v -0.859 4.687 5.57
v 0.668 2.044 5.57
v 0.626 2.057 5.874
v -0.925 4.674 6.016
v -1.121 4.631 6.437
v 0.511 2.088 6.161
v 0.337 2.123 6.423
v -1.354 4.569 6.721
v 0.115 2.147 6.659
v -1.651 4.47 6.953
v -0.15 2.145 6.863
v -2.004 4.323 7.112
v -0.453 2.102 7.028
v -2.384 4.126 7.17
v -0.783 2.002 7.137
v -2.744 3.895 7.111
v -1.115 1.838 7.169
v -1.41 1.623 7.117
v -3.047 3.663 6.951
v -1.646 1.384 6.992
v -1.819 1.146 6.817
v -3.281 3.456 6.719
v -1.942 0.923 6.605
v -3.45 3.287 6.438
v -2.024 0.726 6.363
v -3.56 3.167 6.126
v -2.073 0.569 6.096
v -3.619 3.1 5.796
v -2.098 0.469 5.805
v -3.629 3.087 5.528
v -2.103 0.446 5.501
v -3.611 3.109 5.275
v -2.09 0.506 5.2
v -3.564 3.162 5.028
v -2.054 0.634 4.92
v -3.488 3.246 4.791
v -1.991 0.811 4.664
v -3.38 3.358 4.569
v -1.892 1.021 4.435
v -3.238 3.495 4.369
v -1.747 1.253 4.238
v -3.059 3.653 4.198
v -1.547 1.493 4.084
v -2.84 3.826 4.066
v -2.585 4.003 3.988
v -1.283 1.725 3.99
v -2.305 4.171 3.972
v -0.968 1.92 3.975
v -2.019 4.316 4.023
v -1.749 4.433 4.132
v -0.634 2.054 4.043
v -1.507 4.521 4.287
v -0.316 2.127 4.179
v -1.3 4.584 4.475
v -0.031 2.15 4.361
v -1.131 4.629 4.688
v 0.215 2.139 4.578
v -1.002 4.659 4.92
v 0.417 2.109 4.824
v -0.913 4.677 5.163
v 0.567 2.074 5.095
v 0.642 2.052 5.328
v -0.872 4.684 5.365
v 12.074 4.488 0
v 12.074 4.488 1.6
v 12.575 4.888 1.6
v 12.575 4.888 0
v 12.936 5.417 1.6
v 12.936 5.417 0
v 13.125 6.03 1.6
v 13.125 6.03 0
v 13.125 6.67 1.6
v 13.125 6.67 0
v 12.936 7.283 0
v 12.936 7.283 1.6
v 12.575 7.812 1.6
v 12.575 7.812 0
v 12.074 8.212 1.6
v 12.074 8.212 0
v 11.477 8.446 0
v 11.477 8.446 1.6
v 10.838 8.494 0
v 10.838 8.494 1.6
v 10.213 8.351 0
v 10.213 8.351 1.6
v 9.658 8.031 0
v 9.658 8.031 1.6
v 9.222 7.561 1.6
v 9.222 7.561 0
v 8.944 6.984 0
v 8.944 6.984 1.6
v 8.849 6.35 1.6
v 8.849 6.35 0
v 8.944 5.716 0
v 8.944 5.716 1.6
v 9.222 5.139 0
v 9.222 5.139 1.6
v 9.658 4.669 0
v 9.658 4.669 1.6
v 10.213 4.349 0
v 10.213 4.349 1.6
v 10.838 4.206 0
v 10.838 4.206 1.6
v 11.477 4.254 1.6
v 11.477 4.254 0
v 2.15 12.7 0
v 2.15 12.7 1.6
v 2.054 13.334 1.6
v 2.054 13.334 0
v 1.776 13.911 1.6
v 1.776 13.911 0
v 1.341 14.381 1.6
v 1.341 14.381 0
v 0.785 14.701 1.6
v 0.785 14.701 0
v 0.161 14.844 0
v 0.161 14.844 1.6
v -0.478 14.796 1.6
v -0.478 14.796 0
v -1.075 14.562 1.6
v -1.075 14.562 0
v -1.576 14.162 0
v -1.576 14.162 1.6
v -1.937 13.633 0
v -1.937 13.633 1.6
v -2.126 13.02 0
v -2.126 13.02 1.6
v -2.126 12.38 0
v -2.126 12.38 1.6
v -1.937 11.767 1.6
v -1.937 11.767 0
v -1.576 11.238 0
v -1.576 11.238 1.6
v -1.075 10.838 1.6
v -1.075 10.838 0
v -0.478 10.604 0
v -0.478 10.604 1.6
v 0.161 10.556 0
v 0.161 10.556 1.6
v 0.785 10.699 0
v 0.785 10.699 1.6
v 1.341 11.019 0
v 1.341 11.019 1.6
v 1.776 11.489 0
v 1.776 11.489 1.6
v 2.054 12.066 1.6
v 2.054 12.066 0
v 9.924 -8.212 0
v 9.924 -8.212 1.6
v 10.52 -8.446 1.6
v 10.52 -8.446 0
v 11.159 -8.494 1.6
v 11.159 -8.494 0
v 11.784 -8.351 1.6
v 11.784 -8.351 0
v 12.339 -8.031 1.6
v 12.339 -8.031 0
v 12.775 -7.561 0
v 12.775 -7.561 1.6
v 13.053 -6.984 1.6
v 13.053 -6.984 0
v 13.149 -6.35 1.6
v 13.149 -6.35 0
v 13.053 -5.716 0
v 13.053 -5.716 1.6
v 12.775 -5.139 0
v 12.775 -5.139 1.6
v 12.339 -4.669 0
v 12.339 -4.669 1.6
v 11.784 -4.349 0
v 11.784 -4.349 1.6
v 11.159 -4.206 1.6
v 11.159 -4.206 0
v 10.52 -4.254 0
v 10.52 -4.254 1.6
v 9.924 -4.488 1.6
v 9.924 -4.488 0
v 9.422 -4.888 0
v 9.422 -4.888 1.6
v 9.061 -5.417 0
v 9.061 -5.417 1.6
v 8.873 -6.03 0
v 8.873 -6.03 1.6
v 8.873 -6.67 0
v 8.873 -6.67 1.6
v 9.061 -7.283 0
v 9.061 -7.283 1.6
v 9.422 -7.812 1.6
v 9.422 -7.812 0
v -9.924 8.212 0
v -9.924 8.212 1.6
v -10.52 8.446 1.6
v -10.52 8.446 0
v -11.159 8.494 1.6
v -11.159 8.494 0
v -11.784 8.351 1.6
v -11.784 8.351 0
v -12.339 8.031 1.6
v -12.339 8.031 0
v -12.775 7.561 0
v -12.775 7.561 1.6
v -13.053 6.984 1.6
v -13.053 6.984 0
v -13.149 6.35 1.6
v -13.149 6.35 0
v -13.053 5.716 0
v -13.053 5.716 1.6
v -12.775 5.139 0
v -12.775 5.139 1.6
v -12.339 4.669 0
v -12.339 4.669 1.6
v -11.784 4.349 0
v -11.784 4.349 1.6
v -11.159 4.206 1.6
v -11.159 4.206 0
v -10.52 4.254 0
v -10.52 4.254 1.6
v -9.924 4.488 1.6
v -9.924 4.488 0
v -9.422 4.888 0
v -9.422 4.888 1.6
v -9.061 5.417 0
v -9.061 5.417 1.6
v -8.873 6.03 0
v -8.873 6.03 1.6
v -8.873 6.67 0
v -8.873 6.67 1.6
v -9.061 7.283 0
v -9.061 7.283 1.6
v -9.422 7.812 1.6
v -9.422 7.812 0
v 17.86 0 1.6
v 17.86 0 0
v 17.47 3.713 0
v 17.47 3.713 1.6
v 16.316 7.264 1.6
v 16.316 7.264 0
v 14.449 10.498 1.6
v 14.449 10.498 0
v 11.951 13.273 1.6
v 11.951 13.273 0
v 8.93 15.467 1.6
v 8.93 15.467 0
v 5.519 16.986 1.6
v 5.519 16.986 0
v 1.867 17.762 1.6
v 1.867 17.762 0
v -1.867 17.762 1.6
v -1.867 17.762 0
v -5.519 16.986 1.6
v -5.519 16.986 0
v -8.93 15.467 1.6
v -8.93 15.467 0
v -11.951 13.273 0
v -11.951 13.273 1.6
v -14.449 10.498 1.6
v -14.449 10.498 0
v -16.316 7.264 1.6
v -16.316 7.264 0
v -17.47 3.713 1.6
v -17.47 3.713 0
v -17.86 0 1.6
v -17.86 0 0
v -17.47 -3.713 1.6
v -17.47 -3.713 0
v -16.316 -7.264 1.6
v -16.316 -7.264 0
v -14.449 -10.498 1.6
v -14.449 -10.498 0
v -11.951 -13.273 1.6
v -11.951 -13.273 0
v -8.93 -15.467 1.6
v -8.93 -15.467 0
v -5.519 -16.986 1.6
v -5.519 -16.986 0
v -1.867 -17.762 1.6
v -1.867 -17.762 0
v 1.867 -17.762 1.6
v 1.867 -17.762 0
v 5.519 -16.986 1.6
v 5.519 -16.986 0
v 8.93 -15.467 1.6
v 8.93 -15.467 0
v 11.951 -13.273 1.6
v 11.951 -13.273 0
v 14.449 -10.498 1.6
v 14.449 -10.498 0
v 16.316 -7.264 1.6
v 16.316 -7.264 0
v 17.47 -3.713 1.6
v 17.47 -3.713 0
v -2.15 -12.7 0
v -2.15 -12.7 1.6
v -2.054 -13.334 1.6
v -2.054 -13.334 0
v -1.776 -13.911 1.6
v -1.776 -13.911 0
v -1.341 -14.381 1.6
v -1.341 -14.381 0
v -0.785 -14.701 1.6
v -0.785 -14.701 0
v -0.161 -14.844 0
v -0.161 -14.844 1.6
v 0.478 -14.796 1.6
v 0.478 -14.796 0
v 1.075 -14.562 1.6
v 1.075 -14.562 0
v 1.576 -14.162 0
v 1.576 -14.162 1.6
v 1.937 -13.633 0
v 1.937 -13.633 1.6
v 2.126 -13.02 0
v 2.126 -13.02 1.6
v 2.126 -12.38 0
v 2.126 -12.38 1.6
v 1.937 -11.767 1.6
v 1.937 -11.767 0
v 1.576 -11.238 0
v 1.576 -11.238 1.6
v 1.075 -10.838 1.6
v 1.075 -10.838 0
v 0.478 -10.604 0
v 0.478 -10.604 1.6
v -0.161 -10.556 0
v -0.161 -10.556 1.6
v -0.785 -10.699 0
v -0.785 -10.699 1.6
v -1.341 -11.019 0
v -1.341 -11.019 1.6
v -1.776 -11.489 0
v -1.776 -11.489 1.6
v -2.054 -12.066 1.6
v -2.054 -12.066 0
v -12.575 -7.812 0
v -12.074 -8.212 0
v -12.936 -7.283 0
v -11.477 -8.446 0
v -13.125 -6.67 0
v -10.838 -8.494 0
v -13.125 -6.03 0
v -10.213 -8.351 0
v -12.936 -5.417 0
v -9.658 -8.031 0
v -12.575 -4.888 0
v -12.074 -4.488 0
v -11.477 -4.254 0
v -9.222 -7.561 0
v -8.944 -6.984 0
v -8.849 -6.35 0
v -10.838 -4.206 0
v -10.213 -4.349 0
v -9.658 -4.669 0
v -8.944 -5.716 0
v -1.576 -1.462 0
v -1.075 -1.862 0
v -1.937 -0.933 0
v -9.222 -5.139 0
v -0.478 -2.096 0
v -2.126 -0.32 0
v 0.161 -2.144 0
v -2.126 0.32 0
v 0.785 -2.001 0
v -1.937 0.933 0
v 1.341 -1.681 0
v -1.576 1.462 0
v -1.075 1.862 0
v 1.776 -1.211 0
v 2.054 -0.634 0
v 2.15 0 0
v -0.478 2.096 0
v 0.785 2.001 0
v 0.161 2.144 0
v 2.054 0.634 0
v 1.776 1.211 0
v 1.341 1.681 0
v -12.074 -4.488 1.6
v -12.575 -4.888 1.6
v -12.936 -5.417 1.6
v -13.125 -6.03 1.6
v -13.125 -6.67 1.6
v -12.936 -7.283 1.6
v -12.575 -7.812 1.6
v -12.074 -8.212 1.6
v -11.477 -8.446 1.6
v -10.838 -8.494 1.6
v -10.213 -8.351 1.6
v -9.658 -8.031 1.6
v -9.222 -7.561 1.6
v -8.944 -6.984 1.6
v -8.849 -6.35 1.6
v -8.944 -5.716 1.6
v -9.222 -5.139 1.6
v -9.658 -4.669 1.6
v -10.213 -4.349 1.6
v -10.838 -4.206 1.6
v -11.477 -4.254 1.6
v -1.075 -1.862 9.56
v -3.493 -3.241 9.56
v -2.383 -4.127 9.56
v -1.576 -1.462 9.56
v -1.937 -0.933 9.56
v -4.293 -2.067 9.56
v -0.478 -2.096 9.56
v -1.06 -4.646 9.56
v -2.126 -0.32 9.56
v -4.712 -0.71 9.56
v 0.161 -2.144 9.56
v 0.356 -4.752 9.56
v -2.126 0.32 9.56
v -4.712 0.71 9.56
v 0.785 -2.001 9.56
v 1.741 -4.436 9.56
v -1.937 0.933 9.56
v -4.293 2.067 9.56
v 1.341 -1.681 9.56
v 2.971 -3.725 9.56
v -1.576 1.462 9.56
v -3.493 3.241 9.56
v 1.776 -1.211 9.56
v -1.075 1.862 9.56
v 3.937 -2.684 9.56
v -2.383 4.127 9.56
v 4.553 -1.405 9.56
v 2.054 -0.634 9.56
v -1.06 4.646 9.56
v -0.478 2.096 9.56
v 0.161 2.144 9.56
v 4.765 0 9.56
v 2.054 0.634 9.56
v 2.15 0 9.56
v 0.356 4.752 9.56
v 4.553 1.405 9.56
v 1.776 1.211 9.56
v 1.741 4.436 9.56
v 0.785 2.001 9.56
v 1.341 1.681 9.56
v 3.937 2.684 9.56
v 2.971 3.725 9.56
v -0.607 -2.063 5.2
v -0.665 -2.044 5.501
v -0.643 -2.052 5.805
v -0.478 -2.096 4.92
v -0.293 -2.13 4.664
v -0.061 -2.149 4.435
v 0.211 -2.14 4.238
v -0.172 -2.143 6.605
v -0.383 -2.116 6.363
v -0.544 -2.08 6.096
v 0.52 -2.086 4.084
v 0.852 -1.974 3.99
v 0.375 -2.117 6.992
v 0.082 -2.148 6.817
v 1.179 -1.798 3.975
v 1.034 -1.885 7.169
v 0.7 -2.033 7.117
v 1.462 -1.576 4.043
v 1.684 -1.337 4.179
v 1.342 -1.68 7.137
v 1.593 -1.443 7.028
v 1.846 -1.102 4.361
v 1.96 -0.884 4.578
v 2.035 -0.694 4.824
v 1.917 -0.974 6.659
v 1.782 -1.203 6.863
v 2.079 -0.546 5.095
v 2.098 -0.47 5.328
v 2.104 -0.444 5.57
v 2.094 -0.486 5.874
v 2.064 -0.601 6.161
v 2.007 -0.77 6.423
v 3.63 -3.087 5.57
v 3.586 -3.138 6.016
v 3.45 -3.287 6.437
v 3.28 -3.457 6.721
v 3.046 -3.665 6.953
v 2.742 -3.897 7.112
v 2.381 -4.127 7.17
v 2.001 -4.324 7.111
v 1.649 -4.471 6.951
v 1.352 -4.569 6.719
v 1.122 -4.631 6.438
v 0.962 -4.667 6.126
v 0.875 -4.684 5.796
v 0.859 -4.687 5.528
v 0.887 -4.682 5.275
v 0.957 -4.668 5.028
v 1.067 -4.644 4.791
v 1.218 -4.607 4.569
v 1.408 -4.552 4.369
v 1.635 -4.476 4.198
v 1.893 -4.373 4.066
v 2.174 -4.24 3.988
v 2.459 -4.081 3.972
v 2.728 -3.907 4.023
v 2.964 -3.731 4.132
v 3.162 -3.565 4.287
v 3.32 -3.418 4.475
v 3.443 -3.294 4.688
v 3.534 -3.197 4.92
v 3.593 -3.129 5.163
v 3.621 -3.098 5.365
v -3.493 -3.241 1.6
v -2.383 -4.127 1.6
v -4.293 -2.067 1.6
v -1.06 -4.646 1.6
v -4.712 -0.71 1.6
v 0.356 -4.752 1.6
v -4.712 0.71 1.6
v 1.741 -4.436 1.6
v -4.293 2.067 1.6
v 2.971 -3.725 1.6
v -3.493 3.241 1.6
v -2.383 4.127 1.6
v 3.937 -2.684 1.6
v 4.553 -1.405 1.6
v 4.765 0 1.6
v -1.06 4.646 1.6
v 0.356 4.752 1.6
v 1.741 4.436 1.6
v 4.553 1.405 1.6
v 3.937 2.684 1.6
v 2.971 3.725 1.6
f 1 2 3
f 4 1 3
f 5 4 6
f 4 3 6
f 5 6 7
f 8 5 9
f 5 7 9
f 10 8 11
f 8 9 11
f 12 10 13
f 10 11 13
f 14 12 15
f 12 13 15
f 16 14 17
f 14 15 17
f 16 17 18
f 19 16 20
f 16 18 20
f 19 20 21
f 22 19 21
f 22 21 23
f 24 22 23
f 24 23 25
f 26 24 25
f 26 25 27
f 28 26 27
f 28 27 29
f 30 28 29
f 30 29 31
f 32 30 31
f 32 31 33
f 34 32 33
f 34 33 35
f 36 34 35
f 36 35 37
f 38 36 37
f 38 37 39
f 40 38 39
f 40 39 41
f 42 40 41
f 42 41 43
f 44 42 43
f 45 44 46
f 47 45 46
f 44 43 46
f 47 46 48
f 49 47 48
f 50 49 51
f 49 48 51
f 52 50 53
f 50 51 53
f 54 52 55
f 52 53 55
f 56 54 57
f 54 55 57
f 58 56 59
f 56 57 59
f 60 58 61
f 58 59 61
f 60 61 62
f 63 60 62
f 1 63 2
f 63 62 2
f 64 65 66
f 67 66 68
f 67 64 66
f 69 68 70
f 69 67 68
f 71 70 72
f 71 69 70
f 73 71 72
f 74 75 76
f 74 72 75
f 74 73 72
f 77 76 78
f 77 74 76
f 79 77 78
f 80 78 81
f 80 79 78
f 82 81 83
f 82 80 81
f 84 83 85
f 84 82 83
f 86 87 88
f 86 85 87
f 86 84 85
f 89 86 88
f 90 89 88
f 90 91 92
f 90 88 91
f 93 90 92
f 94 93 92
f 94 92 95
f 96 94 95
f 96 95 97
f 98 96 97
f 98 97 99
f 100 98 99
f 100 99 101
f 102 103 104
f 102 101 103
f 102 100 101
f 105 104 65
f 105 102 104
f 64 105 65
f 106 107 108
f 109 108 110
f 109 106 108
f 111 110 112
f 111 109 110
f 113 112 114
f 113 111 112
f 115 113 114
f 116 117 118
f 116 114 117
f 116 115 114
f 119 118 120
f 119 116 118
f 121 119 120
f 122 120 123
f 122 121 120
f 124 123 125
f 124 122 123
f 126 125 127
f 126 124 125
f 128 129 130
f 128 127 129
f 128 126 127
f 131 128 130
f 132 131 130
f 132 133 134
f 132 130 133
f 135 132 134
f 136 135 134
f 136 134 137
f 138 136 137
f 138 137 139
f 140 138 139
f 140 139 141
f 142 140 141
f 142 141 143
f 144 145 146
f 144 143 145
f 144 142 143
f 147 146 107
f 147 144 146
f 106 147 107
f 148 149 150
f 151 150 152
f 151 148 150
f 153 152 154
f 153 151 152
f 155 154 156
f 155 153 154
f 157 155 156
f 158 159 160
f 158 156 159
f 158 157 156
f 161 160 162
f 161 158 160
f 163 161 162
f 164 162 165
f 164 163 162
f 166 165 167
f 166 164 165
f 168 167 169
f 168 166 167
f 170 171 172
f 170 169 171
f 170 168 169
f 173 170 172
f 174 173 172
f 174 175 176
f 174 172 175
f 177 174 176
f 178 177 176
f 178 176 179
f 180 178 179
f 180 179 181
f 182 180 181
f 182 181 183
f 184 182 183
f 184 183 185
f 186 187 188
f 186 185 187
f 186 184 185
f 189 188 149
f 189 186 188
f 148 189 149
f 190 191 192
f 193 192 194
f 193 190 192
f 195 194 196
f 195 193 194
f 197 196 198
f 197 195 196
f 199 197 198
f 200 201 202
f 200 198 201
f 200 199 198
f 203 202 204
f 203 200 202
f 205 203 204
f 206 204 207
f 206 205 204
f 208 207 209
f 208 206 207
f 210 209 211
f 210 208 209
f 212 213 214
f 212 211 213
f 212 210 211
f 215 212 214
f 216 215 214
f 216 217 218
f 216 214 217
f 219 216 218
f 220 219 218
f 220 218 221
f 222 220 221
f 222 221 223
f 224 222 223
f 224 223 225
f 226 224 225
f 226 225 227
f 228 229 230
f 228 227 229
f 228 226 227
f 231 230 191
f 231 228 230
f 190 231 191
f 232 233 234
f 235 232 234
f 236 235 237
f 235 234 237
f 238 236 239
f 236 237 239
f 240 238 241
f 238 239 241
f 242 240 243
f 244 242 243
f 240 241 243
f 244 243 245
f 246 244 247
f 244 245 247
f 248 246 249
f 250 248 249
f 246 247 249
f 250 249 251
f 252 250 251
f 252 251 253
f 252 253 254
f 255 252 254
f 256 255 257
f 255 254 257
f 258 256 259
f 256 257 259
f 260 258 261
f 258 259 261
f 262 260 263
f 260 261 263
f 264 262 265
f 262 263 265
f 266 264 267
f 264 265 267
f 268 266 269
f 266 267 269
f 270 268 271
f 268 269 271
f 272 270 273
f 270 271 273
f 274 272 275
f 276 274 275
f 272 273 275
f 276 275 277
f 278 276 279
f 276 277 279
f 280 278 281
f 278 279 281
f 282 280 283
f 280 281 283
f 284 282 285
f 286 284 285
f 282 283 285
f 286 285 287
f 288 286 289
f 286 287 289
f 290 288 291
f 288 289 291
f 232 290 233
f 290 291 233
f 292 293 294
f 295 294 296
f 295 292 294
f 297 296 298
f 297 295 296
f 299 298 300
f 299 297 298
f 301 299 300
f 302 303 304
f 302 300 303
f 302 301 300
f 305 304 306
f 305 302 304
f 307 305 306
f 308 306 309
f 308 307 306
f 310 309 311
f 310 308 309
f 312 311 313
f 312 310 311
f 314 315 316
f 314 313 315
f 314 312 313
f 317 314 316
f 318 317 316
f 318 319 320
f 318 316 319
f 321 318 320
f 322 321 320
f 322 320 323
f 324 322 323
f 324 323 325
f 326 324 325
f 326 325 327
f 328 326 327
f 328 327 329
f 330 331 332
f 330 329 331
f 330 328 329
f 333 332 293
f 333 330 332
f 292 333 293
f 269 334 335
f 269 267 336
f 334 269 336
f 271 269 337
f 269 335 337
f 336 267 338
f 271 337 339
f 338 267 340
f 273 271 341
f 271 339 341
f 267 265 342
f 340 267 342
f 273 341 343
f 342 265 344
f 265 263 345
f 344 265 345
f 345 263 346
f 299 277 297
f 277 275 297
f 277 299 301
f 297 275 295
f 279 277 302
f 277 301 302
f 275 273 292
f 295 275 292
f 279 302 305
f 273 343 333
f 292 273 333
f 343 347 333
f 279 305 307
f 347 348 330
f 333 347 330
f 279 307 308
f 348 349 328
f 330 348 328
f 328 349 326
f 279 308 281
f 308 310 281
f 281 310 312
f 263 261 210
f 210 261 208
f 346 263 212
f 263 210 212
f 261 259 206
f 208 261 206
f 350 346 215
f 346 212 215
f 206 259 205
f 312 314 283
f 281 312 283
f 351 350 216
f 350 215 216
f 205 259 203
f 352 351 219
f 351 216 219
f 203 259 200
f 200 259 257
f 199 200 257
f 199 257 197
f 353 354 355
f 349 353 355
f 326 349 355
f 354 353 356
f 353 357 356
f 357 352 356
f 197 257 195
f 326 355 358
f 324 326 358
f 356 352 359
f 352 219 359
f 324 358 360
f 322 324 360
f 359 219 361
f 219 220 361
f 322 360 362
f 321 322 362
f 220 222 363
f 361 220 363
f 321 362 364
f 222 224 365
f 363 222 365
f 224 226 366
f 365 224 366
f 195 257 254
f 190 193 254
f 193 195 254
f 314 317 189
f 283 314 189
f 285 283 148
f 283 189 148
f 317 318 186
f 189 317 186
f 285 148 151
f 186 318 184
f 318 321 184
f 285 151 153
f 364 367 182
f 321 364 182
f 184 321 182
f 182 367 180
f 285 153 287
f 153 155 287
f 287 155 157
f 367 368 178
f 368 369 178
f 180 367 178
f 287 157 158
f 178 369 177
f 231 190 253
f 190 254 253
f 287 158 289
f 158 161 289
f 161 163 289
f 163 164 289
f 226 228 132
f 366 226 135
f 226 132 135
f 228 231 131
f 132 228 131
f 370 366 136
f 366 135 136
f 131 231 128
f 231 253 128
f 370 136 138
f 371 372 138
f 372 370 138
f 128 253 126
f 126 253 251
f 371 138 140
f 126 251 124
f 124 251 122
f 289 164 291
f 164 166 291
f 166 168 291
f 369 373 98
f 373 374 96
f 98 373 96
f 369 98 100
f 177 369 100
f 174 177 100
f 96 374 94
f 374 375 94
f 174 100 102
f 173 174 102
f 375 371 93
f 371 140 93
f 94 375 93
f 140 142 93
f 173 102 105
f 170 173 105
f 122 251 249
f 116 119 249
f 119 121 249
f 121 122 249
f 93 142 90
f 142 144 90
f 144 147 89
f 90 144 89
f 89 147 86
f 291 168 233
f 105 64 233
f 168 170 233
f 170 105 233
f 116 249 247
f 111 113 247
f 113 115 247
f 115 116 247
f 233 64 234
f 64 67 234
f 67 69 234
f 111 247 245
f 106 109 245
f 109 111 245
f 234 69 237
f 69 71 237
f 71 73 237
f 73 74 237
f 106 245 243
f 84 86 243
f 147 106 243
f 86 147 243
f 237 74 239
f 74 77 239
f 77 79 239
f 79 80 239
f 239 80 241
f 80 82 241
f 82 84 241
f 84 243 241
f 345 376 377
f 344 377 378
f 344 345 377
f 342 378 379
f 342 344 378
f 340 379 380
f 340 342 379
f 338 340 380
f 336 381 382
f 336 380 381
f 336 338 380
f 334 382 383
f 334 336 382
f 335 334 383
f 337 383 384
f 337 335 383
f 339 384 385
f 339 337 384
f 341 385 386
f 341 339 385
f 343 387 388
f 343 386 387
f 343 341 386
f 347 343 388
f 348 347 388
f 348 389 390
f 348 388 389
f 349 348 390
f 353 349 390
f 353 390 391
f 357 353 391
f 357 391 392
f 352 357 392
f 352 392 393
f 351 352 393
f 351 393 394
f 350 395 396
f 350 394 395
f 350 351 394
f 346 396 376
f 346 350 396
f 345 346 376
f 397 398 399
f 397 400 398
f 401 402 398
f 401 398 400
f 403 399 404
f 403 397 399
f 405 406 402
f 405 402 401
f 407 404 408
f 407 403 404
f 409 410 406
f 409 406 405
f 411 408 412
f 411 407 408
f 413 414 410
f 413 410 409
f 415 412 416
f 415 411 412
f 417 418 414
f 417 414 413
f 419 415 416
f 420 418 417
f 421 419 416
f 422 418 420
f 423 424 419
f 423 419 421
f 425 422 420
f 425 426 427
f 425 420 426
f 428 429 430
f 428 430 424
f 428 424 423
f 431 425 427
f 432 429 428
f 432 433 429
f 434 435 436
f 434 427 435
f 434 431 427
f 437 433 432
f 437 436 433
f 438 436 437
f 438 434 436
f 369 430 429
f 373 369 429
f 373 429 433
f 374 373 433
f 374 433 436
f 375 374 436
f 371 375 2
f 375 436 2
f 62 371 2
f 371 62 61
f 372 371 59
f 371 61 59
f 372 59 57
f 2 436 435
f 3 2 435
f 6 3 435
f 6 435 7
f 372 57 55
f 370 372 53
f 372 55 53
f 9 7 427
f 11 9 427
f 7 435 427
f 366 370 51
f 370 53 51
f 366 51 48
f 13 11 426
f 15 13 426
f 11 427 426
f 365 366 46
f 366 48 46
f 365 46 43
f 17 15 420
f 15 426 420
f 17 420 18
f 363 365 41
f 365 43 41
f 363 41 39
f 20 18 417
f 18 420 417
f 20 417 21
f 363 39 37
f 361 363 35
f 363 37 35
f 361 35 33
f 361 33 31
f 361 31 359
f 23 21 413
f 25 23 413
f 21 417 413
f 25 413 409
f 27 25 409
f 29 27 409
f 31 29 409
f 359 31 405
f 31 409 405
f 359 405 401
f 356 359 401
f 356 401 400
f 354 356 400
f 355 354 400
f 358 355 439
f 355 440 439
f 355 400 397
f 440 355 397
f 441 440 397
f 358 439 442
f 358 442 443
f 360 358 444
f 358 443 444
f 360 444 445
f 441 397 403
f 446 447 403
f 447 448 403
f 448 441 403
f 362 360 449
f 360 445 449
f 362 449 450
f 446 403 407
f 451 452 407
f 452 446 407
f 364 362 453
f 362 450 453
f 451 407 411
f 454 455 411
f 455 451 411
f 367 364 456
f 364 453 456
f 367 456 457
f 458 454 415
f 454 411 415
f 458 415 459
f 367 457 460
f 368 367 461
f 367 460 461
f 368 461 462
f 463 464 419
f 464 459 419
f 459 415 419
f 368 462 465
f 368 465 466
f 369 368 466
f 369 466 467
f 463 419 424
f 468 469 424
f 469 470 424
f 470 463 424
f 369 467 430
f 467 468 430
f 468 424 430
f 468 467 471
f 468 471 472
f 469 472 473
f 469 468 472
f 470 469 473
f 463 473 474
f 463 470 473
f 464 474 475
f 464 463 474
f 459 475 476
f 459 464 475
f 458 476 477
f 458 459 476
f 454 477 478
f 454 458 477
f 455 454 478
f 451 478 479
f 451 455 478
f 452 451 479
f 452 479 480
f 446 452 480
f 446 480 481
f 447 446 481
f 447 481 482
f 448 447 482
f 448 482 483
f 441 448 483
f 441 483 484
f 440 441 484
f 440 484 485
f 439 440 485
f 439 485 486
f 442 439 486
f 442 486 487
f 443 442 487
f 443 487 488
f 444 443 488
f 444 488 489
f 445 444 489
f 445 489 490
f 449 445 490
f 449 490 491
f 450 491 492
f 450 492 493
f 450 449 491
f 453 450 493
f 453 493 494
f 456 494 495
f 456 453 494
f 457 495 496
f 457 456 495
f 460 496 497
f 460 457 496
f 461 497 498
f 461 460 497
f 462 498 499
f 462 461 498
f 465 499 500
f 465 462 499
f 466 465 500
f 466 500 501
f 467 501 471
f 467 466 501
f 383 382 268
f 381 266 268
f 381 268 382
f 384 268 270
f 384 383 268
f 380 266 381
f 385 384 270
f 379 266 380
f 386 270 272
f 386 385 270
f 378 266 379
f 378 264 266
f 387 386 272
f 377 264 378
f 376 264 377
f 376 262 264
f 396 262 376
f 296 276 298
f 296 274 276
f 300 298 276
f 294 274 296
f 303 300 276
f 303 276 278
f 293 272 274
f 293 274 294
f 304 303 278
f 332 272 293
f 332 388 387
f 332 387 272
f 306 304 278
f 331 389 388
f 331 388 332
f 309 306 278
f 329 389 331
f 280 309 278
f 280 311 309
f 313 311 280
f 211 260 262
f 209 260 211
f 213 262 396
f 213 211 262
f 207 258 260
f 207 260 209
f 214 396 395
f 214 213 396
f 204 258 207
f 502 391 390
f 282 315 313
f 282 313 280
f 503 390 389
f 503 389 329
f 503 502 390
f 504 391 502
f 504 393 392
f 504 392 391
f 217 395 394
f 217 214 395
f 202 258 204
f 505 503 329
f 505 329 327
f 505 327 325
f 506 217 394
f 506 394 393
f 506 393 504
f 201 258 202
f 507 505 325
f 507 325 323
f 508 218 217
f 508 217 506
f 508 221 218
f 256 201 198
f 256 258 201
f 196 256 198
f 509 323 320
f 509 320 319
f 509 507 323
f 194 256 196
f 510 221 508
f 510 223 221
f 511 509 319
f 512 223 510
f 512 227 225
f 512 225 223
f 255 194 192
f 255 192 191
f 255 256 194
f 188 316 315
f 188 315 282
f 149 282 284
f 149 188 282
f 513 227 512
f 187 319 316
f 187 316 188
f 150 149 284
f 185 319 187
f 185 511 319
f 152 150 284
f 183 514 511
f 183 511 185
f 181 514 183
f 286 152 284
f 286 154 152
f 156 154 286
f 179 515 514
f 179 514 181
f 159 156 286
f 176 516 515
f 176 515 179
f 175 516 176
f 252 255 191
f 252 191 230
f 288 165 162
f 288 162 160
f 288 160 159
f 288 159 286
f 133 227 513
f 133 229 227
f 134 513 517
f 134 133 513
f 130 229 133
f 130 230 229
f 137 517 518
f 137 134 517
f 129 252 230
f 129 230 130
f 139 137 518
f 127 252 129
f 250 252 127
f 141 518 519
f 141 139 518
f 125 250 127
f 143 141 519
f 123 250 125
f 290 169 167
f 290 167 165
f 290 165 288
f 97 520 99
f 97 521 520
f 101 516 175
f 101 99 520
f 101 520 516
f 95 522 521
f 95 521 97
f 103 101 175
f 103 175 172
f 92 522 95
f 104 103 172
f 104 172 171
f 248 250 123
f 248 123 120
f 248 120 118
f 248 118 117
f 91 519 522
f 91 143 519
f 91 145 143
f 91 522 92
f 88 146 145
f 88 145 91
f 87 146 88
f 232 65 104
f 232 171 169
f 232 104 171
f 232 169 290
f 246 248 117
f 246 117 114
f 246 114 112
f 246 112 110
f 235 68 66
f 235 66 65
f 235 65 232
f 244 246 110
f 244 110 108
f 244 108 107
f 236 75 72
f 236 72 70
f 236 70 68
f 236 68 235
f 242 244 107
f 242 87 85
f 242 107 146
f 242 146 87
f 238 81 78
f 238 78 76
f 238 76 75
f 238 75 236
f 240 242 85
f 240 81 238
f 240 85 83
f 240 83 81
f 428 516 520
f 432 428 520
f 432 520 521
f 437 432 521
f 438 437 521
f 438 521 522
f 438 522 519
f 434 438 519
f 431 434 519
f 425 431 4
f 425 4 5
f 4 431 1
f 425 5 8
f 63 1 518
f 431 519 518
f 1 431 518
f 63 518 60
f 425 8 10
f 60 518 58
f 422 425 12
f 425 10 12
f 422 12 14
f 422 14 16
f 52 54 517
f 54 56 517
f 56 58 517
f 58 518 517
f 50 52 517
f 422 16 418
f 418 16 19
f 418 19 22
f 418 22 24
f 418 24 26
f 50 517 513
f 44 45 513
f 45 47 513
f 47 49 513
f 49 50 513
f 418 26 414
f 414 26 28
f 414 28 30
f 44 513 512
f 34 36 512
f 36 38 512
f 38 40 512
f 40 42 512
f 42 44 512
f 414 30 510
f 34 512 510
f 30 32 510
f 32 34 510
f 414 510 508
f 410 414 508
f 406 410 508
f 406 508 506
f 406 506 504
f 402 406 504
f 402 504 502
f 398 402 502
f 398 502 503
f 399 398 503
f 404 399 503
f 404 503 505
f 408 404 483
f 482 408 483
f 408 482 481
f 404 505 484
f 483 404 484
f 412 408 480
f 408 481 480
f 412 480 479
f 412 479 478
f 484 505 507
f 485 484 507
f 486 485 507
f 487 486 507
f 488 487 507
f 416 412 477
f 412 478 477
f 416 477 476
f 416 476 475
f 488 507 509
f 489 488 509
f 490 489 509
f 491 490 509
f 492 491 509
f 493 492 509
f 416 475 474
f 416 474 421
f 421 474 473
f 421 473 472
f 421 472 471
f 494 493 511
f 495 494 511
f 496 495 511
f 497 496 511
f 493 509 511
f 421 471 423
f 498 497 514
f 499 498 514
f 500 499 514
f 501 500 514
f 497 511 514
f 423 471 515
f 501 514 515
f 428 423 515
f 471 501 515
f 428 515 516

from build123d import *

# Parameters (mm, degrees)
SKETCH_R             = 17.86
PAD_DEPTH            = 1.6
SKETCH001_R          = 4.765
PAD001_DEPTH         = 7.96
SKETCH002_R          = 2.15
POCKET_DEPTH         = 9.561
SKETCH003_R          = 1.6
POCKET001_DEPTH      = 5
POCKET001_DEPTH_BACK = -5
SKETCH004_R          = 2.15
POCKET002_DEPTH      = 112.385713
POLARPATTERN_COUNT   = 6


with BuildPart() as part:
    # Sketch → Pad (new body)
    with BuildSketch(Plane.XY):
        Circle(SKETCH_R)
    extrude(amount=PAD_DEPTH)

    # Sketch001 (on Face3 of Pad) → Pad001 (join)
    with BuildSketch(Plane.XY.offset(1.6)):
        Circle(SKETCH001_R)
    extrude(amount=PAD001_DEPTH)

    # Sketch002 (on Face5 of Pad001) → Pocket (cut, through all)
    with BuildSketch(Plane.XY.offset(9.56)):
        Circle(SKETCH002_R)
    extrude(amount=-POCKET_DEPTH, mode=Mode.SUBTRACT)

    # Sketch003 (on DatumPlane) → Pocket001 (cut, two sides)
    with BuildSketch(Plane(origin=(0, 0, 0), x_dir=(0.866025, 0.5, 0), z_dir=(0.5, -0.866025, 0))) as pocket001_sk:
        with Locations((0, 5.57)):
            Circle(SKETCH003_R)
    extrude(amount=-POCKET001_DEPTH, mode=Mode.SUBTRACT)
    extrude(pocket001_sk.sketch, amount=-POCKET001_DEPTH_BACK, mode=Mode.SUBTRACT)

    # Sketch004 → Pocket002 (cut, through all)
    with BuildSketch(Plane.XY):
        with Locations((0, 12.7)):
            Circle(SKETCH004_R)
    pocket002 = extrude(amount=POCKET002_DEPTH, mode=Mode.SUBTRACT)

    # PolarPattern: Pocket002 ×6 about axis
    polarpattern_axis = Axis((0, 0, 0), (0, 0, 1))
    for i in range(1, POLARPATTERN_COUNT):
        add(pocket002.rotate(polarpattern_axis, i * 360 / POLARPATTERN_COUNT), mode=Mode.SUBTRACT)


solid = part.part
